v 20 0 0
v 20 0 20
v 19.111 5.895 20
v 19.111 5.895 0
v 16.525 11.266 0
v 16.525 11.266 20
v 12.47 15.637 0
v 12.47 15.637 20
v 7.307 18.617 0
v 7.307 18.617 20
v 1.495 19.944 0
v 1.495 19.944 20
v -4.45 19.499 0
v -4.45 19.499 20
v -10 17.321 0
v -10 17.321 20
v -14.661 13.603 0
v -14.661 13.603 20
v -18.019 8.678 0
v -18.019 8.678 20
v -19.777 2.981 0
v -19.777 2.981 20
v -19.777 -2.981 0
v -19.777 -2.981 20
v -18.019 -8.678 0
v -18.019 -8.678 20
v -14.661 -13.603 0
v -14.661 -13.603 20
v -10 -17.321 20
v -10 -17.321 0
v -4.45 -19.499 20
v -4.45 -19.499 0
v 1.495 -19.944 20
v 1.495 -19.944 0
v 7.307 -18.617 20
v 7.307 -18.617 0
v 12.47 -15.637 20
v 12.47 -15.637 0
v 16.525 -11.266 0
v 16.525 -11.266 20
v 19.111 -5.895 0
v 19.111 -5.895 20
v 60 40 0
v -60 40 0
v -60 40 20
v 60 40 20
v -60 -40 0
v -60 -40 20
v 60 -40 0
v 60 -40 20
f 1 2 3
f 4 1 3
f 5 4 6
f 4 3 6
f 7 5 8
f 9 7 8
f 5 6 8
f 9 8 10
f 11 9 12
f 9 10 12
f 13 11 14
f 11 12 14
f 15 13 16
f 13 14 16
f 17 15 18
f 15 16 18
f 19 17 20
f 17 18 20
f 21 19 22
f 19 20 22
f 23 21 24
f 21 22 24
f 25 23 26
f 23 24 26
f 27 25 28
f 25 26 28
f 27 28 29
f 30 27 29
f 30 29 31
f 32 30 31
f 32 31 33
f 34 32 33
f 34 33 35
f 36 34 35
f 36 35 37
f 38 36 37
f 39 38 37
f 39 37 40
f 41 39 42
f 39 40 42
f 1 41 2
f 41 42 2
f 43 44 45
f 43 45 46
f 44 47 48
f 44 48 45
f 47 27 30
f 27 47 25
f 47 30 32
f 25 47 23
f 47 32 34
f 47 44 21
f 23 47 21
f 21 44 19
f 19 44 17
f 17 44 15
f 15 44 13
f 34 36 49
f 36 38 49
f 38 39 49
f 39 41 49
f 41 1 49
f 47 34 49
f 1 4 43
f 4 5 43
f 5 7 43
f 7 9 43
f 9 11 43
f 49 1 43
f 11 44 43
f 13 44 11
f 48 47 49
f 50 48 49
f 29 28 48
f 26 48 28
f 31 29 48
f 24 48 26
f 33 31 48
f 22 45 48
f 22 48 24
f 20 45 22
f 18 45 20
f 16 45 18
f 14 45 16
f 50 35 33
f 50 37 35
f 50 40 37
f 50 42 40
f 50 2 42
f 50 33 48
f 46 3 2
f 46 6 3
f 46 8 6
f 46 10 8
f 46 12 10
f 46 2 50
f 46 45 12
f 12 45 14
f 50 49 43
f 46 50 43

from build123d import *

# Parameters (mm, degrees)
SKETCH_W     = 120
SKETCH_H     = 80
PAD_DEPTH    = 20
SKETCH001_R  = 20
POCKET_DEPTH = 20


with BuildPart() as part:
    # Sketch → Pad (new body)
    with BuildSketch(Plane.XY):
        Rectangle(SKETCH_W, SKETCH_H)
    extrude(amount=PAD_DEPTH)

    # Sketch001 (on Face6 of Pad) → Pocket (cut)
    with BuildSketch(Plane.XY.offset(20)):
        Circle(SKETCH001_R)
    extrude(amount=-POCKET_DEPTH, mode=Mode.SUBTRACT)


solid = part.part
